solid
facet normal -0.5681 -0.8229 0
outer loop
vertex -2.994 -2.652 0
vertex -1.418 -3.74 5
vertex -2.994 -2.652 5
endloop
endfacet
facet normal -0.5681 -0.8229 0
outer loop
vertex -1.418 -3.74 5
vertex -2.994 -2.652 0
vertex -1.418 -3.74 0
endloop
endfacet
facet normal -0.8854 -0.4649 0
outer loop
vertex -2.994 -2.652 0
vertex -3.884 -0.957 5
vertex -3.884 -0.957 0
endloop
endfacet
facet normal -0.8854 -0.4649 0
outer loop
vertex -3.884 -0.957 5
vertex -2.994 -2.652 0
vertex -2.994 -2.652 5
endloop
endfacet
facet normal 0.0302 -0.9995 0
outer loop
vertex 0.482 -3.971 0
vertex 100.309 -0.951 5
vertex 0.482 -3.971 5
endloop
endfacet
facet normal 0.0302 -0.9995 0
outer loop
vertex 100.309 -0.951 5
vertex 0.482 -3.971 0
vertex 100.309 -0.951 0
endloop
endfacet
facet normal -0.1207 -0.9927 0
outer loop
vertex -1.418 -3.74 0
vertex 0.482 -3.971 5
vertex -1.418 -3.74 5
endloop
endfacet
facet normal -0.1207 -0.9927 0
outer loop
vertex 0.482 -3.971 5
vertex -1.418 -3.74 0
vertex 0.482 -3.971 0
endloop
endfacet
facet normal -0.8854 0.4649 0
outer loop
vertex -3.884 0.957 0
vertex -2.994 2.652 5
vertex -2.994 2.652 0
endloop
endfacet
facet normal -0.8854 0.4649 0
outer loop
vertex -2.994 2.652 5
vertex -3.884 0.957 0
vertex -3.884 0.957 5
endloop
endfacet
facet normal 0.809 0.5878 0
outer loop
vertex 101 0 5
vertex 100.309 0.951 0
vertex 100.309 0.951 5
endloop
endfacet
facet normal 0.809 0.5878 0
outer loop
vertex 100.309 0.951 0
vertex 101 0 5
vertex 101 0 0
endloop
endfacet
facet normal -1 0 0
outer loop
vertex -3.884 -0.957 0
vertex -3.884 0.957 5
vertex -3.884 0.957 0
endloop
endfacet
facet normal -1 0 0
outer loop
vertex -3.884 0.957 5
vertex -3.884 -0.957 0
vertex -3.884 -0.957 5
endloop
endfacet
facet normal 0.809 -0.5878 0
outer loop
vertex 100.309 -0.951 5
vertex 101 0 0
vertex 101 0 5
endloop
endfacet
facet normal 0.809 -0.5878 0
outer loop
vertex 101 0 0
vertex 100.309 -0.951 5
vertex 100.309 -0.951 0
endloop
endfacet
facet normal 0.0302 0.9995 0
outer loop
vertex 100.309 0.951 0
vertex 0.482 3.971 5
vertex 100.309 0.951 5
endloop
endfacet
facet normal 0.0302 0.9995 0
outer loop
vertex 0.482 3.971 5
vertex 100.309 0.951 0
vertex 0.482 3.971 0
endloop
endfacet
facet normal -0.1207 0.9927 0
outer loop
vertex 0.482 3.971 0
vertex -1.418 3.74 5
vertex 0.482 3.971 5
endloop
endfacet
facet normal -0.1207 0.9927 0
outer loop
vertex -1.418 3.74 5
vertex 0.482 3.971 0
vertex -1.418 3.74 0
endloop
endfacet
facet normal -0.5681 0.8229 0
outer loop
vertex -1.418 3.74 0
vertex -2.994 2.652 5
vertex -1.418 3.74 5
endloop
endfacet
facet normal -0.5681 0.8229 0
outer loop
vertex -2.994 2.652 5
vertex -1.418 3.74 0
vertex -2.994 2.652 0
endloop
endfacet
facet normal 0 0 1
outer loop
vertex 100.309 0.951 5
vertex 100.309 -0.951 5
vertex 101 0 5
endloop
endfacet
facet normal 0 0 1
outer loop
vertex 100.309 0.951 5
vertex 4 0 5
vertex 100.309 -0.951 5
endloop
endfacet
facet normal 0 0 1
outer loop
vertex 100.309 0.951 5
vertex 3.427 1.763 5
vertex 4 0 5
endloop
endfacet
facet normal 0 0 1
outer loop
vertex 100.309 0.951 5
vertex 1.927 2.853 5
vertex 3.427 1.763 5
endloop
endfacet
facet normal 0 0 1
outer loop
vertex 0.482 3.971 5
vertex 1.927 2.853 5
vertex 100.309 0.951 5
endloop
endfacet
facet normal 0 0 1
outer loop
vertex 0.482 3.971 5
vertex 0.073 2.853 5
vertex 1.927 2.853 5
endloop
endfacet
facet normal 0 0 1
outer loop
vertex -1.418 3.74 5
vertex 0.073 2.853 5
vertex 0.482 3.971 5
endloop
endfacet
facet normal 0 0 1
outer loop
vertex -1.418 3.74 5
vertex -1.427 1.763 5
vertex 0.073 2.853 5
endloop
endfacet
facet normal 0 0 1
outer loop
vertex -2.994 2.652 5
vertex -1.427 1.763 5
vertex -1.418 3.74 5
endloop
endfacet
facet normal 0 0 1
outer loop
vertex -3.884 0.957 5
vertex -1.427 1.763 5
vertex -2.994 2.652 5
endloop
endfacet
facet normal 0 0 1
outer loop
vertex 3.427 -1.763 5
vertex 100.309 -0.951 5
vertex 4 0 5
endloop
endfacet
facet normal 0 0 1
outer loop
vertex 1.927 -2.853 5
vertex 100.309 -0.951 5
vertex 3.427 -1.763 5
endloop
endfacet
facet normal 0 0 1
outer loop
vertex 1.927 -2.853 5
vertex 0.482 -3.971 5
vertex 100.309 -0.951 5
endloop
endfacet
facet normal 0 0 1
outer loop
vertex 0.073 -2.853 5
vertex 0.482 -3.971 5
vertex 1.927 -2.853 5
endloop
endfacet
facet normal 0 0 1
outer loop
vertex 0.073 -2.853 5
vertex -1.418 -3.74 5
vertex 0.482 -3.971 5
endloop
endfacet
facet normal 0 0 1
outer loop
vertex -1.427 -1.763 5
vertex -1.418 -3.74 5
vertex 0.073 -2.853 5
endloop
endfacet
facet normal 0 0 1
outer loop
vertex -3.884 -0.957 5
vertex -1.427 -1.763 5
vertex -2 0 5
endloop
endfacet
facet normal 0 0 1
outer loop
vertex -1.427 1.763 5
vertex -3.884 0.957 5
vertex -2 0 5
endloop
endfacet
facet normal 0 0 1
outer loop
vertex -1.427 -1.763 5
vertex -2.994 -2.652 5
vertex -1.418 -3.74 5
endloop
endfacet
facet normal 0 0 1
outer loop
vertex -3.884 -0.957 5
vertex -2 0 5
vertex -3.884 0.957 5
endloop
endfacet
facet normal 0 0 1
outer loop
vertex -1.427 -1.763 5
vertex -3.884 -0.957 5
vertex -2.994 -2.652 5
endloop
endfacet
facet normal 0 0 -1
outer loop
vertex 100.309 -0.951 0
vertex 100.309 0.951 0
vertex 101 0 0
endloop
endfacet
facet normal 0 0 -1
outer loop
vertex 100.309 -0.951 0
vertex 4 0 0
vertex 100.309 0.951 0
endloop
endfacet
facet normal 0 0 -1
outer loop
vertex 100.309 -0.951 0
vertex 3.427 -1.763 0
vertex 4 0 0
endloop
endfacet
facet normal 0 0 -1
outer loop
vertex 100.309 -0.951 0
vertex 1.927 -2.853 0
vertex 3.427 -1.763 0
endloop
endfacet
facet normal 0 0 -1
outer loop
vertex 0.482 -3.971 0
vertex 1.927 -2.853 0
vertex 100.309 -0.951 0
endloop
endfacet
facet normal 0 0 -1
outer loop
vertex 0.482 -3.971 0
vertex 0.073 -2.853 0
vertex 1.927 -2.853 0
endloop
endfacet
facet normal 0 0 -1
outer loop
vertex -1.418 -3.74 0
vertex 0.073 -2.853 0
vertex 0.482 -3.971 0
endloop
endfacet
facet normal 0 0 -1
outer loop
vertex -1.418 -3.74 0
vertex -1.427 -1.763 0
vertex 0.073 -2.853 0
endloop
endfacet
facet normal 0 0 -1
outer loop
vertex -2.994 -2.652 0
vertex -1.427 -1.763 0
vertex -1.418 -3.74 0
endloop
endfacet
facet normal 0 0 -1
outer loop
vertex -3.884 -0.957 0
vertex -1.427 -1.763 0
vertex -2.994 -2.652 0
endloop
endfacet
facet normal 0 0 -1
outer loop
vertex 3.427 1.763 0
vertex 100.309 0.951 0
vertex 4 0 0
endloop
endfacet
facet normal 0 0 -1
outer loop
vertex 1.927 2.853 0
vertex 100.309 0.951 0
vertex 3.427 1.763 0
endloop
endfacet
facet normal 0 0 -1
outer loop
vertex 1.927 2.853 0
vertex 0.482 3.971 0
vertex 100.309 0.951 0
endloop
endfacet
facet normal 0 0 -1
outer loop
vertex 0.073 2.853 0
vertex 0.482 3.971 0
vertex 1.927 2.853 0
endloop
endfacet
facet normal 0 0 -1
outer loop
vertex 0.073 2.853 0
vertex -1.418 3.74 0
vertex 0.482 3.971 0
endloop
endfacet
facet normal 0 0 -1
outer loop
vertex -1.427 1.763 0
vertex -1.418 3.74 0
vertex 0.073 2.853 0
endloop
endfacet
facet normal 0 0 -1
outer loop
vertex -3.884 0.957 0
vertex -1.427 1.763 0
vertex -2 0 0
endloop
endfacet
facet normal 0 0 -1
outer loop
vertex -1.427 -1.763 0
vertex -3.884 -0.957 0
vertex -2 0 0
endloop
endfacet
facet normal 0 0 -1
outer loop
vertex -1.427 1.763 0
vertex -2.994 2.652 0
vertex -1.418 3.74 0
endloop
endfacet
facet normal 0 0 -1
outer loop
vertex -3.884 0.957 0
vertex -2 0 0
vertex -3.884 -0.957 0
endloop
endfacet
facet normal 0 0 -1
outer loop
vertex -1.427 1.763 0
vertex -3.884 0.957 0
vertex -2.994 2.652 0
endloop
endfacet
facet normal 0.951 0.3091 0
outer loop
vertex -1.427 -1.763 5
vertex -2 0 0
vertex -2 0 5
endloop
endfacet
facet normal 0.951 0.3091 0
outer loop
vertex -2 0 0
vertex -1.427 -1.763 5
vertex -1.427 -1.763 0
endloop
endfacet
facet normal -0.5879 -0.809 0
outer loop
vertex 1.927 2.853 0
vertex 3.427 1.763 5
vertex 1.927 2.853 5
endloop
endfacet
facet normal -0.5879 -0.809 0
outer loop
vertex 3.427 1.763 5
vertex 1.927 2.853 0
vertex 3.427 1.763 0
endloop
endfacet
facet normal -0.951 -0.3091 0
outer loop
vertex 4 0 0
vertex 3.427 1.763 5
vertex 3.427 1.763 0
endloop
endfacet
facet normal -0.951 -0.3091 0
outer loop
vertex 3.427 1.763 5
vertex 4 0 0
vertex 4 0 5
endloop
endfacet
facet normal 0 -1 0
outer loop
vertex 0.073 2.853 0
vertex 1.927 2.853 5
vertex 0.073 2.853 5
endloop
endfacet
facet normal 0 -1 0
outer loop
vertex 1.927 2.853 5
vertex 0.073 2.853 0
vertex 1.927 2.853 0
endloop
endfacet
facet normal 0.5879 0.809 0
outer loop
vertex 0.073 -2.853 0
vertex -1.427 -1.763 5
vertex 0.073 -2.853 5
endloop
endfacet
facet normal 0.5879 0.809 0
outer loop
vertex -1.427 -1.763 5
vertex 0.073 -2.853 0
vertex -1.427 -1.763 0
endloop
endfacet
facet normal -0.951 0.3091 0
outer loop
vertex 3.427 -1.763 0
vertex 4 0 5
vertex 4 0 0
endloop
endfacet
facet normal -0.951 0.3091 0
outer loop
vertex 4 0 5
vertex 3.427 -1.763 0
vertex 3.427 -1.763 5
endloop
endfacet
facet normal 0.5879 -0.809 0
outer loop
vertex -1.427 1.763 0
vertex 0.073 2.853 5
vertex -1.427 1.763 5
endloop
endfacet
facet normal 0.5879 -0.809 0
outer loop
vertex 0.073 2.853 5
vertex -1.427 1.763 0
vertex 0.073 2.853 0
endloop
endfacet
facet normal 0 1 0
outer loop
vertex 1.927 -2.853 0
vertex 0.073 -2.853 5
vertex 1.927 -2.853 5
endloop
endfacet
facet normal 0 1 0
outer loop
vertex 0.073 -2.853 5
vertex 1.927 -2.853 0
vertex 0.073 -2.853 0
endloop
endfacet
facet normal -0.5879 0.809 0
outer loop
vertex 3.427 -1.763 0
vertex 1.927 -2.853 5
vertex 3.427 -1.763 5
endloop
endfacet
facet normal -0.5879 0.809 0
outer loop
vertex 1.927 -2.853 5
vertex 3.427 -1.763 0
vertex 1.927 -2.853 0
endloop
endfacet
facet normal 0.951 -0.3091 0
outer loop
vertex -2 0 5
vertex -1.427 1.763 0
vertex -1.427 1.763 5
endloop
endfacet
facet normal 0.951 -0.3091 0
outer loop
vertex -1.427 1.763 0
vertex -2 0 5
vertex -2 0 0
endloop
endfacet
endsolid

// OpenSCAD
difference(){
    hull(){
        cylinder(r=4,h=5);
        translate([100,0,0]){
            cylinder(r=1,h=5);
        }
    }

    translate([1,0,-1]){
        //cylinder(r=8,h=7);
        cylinder(r=3,h=7);
    }
}
